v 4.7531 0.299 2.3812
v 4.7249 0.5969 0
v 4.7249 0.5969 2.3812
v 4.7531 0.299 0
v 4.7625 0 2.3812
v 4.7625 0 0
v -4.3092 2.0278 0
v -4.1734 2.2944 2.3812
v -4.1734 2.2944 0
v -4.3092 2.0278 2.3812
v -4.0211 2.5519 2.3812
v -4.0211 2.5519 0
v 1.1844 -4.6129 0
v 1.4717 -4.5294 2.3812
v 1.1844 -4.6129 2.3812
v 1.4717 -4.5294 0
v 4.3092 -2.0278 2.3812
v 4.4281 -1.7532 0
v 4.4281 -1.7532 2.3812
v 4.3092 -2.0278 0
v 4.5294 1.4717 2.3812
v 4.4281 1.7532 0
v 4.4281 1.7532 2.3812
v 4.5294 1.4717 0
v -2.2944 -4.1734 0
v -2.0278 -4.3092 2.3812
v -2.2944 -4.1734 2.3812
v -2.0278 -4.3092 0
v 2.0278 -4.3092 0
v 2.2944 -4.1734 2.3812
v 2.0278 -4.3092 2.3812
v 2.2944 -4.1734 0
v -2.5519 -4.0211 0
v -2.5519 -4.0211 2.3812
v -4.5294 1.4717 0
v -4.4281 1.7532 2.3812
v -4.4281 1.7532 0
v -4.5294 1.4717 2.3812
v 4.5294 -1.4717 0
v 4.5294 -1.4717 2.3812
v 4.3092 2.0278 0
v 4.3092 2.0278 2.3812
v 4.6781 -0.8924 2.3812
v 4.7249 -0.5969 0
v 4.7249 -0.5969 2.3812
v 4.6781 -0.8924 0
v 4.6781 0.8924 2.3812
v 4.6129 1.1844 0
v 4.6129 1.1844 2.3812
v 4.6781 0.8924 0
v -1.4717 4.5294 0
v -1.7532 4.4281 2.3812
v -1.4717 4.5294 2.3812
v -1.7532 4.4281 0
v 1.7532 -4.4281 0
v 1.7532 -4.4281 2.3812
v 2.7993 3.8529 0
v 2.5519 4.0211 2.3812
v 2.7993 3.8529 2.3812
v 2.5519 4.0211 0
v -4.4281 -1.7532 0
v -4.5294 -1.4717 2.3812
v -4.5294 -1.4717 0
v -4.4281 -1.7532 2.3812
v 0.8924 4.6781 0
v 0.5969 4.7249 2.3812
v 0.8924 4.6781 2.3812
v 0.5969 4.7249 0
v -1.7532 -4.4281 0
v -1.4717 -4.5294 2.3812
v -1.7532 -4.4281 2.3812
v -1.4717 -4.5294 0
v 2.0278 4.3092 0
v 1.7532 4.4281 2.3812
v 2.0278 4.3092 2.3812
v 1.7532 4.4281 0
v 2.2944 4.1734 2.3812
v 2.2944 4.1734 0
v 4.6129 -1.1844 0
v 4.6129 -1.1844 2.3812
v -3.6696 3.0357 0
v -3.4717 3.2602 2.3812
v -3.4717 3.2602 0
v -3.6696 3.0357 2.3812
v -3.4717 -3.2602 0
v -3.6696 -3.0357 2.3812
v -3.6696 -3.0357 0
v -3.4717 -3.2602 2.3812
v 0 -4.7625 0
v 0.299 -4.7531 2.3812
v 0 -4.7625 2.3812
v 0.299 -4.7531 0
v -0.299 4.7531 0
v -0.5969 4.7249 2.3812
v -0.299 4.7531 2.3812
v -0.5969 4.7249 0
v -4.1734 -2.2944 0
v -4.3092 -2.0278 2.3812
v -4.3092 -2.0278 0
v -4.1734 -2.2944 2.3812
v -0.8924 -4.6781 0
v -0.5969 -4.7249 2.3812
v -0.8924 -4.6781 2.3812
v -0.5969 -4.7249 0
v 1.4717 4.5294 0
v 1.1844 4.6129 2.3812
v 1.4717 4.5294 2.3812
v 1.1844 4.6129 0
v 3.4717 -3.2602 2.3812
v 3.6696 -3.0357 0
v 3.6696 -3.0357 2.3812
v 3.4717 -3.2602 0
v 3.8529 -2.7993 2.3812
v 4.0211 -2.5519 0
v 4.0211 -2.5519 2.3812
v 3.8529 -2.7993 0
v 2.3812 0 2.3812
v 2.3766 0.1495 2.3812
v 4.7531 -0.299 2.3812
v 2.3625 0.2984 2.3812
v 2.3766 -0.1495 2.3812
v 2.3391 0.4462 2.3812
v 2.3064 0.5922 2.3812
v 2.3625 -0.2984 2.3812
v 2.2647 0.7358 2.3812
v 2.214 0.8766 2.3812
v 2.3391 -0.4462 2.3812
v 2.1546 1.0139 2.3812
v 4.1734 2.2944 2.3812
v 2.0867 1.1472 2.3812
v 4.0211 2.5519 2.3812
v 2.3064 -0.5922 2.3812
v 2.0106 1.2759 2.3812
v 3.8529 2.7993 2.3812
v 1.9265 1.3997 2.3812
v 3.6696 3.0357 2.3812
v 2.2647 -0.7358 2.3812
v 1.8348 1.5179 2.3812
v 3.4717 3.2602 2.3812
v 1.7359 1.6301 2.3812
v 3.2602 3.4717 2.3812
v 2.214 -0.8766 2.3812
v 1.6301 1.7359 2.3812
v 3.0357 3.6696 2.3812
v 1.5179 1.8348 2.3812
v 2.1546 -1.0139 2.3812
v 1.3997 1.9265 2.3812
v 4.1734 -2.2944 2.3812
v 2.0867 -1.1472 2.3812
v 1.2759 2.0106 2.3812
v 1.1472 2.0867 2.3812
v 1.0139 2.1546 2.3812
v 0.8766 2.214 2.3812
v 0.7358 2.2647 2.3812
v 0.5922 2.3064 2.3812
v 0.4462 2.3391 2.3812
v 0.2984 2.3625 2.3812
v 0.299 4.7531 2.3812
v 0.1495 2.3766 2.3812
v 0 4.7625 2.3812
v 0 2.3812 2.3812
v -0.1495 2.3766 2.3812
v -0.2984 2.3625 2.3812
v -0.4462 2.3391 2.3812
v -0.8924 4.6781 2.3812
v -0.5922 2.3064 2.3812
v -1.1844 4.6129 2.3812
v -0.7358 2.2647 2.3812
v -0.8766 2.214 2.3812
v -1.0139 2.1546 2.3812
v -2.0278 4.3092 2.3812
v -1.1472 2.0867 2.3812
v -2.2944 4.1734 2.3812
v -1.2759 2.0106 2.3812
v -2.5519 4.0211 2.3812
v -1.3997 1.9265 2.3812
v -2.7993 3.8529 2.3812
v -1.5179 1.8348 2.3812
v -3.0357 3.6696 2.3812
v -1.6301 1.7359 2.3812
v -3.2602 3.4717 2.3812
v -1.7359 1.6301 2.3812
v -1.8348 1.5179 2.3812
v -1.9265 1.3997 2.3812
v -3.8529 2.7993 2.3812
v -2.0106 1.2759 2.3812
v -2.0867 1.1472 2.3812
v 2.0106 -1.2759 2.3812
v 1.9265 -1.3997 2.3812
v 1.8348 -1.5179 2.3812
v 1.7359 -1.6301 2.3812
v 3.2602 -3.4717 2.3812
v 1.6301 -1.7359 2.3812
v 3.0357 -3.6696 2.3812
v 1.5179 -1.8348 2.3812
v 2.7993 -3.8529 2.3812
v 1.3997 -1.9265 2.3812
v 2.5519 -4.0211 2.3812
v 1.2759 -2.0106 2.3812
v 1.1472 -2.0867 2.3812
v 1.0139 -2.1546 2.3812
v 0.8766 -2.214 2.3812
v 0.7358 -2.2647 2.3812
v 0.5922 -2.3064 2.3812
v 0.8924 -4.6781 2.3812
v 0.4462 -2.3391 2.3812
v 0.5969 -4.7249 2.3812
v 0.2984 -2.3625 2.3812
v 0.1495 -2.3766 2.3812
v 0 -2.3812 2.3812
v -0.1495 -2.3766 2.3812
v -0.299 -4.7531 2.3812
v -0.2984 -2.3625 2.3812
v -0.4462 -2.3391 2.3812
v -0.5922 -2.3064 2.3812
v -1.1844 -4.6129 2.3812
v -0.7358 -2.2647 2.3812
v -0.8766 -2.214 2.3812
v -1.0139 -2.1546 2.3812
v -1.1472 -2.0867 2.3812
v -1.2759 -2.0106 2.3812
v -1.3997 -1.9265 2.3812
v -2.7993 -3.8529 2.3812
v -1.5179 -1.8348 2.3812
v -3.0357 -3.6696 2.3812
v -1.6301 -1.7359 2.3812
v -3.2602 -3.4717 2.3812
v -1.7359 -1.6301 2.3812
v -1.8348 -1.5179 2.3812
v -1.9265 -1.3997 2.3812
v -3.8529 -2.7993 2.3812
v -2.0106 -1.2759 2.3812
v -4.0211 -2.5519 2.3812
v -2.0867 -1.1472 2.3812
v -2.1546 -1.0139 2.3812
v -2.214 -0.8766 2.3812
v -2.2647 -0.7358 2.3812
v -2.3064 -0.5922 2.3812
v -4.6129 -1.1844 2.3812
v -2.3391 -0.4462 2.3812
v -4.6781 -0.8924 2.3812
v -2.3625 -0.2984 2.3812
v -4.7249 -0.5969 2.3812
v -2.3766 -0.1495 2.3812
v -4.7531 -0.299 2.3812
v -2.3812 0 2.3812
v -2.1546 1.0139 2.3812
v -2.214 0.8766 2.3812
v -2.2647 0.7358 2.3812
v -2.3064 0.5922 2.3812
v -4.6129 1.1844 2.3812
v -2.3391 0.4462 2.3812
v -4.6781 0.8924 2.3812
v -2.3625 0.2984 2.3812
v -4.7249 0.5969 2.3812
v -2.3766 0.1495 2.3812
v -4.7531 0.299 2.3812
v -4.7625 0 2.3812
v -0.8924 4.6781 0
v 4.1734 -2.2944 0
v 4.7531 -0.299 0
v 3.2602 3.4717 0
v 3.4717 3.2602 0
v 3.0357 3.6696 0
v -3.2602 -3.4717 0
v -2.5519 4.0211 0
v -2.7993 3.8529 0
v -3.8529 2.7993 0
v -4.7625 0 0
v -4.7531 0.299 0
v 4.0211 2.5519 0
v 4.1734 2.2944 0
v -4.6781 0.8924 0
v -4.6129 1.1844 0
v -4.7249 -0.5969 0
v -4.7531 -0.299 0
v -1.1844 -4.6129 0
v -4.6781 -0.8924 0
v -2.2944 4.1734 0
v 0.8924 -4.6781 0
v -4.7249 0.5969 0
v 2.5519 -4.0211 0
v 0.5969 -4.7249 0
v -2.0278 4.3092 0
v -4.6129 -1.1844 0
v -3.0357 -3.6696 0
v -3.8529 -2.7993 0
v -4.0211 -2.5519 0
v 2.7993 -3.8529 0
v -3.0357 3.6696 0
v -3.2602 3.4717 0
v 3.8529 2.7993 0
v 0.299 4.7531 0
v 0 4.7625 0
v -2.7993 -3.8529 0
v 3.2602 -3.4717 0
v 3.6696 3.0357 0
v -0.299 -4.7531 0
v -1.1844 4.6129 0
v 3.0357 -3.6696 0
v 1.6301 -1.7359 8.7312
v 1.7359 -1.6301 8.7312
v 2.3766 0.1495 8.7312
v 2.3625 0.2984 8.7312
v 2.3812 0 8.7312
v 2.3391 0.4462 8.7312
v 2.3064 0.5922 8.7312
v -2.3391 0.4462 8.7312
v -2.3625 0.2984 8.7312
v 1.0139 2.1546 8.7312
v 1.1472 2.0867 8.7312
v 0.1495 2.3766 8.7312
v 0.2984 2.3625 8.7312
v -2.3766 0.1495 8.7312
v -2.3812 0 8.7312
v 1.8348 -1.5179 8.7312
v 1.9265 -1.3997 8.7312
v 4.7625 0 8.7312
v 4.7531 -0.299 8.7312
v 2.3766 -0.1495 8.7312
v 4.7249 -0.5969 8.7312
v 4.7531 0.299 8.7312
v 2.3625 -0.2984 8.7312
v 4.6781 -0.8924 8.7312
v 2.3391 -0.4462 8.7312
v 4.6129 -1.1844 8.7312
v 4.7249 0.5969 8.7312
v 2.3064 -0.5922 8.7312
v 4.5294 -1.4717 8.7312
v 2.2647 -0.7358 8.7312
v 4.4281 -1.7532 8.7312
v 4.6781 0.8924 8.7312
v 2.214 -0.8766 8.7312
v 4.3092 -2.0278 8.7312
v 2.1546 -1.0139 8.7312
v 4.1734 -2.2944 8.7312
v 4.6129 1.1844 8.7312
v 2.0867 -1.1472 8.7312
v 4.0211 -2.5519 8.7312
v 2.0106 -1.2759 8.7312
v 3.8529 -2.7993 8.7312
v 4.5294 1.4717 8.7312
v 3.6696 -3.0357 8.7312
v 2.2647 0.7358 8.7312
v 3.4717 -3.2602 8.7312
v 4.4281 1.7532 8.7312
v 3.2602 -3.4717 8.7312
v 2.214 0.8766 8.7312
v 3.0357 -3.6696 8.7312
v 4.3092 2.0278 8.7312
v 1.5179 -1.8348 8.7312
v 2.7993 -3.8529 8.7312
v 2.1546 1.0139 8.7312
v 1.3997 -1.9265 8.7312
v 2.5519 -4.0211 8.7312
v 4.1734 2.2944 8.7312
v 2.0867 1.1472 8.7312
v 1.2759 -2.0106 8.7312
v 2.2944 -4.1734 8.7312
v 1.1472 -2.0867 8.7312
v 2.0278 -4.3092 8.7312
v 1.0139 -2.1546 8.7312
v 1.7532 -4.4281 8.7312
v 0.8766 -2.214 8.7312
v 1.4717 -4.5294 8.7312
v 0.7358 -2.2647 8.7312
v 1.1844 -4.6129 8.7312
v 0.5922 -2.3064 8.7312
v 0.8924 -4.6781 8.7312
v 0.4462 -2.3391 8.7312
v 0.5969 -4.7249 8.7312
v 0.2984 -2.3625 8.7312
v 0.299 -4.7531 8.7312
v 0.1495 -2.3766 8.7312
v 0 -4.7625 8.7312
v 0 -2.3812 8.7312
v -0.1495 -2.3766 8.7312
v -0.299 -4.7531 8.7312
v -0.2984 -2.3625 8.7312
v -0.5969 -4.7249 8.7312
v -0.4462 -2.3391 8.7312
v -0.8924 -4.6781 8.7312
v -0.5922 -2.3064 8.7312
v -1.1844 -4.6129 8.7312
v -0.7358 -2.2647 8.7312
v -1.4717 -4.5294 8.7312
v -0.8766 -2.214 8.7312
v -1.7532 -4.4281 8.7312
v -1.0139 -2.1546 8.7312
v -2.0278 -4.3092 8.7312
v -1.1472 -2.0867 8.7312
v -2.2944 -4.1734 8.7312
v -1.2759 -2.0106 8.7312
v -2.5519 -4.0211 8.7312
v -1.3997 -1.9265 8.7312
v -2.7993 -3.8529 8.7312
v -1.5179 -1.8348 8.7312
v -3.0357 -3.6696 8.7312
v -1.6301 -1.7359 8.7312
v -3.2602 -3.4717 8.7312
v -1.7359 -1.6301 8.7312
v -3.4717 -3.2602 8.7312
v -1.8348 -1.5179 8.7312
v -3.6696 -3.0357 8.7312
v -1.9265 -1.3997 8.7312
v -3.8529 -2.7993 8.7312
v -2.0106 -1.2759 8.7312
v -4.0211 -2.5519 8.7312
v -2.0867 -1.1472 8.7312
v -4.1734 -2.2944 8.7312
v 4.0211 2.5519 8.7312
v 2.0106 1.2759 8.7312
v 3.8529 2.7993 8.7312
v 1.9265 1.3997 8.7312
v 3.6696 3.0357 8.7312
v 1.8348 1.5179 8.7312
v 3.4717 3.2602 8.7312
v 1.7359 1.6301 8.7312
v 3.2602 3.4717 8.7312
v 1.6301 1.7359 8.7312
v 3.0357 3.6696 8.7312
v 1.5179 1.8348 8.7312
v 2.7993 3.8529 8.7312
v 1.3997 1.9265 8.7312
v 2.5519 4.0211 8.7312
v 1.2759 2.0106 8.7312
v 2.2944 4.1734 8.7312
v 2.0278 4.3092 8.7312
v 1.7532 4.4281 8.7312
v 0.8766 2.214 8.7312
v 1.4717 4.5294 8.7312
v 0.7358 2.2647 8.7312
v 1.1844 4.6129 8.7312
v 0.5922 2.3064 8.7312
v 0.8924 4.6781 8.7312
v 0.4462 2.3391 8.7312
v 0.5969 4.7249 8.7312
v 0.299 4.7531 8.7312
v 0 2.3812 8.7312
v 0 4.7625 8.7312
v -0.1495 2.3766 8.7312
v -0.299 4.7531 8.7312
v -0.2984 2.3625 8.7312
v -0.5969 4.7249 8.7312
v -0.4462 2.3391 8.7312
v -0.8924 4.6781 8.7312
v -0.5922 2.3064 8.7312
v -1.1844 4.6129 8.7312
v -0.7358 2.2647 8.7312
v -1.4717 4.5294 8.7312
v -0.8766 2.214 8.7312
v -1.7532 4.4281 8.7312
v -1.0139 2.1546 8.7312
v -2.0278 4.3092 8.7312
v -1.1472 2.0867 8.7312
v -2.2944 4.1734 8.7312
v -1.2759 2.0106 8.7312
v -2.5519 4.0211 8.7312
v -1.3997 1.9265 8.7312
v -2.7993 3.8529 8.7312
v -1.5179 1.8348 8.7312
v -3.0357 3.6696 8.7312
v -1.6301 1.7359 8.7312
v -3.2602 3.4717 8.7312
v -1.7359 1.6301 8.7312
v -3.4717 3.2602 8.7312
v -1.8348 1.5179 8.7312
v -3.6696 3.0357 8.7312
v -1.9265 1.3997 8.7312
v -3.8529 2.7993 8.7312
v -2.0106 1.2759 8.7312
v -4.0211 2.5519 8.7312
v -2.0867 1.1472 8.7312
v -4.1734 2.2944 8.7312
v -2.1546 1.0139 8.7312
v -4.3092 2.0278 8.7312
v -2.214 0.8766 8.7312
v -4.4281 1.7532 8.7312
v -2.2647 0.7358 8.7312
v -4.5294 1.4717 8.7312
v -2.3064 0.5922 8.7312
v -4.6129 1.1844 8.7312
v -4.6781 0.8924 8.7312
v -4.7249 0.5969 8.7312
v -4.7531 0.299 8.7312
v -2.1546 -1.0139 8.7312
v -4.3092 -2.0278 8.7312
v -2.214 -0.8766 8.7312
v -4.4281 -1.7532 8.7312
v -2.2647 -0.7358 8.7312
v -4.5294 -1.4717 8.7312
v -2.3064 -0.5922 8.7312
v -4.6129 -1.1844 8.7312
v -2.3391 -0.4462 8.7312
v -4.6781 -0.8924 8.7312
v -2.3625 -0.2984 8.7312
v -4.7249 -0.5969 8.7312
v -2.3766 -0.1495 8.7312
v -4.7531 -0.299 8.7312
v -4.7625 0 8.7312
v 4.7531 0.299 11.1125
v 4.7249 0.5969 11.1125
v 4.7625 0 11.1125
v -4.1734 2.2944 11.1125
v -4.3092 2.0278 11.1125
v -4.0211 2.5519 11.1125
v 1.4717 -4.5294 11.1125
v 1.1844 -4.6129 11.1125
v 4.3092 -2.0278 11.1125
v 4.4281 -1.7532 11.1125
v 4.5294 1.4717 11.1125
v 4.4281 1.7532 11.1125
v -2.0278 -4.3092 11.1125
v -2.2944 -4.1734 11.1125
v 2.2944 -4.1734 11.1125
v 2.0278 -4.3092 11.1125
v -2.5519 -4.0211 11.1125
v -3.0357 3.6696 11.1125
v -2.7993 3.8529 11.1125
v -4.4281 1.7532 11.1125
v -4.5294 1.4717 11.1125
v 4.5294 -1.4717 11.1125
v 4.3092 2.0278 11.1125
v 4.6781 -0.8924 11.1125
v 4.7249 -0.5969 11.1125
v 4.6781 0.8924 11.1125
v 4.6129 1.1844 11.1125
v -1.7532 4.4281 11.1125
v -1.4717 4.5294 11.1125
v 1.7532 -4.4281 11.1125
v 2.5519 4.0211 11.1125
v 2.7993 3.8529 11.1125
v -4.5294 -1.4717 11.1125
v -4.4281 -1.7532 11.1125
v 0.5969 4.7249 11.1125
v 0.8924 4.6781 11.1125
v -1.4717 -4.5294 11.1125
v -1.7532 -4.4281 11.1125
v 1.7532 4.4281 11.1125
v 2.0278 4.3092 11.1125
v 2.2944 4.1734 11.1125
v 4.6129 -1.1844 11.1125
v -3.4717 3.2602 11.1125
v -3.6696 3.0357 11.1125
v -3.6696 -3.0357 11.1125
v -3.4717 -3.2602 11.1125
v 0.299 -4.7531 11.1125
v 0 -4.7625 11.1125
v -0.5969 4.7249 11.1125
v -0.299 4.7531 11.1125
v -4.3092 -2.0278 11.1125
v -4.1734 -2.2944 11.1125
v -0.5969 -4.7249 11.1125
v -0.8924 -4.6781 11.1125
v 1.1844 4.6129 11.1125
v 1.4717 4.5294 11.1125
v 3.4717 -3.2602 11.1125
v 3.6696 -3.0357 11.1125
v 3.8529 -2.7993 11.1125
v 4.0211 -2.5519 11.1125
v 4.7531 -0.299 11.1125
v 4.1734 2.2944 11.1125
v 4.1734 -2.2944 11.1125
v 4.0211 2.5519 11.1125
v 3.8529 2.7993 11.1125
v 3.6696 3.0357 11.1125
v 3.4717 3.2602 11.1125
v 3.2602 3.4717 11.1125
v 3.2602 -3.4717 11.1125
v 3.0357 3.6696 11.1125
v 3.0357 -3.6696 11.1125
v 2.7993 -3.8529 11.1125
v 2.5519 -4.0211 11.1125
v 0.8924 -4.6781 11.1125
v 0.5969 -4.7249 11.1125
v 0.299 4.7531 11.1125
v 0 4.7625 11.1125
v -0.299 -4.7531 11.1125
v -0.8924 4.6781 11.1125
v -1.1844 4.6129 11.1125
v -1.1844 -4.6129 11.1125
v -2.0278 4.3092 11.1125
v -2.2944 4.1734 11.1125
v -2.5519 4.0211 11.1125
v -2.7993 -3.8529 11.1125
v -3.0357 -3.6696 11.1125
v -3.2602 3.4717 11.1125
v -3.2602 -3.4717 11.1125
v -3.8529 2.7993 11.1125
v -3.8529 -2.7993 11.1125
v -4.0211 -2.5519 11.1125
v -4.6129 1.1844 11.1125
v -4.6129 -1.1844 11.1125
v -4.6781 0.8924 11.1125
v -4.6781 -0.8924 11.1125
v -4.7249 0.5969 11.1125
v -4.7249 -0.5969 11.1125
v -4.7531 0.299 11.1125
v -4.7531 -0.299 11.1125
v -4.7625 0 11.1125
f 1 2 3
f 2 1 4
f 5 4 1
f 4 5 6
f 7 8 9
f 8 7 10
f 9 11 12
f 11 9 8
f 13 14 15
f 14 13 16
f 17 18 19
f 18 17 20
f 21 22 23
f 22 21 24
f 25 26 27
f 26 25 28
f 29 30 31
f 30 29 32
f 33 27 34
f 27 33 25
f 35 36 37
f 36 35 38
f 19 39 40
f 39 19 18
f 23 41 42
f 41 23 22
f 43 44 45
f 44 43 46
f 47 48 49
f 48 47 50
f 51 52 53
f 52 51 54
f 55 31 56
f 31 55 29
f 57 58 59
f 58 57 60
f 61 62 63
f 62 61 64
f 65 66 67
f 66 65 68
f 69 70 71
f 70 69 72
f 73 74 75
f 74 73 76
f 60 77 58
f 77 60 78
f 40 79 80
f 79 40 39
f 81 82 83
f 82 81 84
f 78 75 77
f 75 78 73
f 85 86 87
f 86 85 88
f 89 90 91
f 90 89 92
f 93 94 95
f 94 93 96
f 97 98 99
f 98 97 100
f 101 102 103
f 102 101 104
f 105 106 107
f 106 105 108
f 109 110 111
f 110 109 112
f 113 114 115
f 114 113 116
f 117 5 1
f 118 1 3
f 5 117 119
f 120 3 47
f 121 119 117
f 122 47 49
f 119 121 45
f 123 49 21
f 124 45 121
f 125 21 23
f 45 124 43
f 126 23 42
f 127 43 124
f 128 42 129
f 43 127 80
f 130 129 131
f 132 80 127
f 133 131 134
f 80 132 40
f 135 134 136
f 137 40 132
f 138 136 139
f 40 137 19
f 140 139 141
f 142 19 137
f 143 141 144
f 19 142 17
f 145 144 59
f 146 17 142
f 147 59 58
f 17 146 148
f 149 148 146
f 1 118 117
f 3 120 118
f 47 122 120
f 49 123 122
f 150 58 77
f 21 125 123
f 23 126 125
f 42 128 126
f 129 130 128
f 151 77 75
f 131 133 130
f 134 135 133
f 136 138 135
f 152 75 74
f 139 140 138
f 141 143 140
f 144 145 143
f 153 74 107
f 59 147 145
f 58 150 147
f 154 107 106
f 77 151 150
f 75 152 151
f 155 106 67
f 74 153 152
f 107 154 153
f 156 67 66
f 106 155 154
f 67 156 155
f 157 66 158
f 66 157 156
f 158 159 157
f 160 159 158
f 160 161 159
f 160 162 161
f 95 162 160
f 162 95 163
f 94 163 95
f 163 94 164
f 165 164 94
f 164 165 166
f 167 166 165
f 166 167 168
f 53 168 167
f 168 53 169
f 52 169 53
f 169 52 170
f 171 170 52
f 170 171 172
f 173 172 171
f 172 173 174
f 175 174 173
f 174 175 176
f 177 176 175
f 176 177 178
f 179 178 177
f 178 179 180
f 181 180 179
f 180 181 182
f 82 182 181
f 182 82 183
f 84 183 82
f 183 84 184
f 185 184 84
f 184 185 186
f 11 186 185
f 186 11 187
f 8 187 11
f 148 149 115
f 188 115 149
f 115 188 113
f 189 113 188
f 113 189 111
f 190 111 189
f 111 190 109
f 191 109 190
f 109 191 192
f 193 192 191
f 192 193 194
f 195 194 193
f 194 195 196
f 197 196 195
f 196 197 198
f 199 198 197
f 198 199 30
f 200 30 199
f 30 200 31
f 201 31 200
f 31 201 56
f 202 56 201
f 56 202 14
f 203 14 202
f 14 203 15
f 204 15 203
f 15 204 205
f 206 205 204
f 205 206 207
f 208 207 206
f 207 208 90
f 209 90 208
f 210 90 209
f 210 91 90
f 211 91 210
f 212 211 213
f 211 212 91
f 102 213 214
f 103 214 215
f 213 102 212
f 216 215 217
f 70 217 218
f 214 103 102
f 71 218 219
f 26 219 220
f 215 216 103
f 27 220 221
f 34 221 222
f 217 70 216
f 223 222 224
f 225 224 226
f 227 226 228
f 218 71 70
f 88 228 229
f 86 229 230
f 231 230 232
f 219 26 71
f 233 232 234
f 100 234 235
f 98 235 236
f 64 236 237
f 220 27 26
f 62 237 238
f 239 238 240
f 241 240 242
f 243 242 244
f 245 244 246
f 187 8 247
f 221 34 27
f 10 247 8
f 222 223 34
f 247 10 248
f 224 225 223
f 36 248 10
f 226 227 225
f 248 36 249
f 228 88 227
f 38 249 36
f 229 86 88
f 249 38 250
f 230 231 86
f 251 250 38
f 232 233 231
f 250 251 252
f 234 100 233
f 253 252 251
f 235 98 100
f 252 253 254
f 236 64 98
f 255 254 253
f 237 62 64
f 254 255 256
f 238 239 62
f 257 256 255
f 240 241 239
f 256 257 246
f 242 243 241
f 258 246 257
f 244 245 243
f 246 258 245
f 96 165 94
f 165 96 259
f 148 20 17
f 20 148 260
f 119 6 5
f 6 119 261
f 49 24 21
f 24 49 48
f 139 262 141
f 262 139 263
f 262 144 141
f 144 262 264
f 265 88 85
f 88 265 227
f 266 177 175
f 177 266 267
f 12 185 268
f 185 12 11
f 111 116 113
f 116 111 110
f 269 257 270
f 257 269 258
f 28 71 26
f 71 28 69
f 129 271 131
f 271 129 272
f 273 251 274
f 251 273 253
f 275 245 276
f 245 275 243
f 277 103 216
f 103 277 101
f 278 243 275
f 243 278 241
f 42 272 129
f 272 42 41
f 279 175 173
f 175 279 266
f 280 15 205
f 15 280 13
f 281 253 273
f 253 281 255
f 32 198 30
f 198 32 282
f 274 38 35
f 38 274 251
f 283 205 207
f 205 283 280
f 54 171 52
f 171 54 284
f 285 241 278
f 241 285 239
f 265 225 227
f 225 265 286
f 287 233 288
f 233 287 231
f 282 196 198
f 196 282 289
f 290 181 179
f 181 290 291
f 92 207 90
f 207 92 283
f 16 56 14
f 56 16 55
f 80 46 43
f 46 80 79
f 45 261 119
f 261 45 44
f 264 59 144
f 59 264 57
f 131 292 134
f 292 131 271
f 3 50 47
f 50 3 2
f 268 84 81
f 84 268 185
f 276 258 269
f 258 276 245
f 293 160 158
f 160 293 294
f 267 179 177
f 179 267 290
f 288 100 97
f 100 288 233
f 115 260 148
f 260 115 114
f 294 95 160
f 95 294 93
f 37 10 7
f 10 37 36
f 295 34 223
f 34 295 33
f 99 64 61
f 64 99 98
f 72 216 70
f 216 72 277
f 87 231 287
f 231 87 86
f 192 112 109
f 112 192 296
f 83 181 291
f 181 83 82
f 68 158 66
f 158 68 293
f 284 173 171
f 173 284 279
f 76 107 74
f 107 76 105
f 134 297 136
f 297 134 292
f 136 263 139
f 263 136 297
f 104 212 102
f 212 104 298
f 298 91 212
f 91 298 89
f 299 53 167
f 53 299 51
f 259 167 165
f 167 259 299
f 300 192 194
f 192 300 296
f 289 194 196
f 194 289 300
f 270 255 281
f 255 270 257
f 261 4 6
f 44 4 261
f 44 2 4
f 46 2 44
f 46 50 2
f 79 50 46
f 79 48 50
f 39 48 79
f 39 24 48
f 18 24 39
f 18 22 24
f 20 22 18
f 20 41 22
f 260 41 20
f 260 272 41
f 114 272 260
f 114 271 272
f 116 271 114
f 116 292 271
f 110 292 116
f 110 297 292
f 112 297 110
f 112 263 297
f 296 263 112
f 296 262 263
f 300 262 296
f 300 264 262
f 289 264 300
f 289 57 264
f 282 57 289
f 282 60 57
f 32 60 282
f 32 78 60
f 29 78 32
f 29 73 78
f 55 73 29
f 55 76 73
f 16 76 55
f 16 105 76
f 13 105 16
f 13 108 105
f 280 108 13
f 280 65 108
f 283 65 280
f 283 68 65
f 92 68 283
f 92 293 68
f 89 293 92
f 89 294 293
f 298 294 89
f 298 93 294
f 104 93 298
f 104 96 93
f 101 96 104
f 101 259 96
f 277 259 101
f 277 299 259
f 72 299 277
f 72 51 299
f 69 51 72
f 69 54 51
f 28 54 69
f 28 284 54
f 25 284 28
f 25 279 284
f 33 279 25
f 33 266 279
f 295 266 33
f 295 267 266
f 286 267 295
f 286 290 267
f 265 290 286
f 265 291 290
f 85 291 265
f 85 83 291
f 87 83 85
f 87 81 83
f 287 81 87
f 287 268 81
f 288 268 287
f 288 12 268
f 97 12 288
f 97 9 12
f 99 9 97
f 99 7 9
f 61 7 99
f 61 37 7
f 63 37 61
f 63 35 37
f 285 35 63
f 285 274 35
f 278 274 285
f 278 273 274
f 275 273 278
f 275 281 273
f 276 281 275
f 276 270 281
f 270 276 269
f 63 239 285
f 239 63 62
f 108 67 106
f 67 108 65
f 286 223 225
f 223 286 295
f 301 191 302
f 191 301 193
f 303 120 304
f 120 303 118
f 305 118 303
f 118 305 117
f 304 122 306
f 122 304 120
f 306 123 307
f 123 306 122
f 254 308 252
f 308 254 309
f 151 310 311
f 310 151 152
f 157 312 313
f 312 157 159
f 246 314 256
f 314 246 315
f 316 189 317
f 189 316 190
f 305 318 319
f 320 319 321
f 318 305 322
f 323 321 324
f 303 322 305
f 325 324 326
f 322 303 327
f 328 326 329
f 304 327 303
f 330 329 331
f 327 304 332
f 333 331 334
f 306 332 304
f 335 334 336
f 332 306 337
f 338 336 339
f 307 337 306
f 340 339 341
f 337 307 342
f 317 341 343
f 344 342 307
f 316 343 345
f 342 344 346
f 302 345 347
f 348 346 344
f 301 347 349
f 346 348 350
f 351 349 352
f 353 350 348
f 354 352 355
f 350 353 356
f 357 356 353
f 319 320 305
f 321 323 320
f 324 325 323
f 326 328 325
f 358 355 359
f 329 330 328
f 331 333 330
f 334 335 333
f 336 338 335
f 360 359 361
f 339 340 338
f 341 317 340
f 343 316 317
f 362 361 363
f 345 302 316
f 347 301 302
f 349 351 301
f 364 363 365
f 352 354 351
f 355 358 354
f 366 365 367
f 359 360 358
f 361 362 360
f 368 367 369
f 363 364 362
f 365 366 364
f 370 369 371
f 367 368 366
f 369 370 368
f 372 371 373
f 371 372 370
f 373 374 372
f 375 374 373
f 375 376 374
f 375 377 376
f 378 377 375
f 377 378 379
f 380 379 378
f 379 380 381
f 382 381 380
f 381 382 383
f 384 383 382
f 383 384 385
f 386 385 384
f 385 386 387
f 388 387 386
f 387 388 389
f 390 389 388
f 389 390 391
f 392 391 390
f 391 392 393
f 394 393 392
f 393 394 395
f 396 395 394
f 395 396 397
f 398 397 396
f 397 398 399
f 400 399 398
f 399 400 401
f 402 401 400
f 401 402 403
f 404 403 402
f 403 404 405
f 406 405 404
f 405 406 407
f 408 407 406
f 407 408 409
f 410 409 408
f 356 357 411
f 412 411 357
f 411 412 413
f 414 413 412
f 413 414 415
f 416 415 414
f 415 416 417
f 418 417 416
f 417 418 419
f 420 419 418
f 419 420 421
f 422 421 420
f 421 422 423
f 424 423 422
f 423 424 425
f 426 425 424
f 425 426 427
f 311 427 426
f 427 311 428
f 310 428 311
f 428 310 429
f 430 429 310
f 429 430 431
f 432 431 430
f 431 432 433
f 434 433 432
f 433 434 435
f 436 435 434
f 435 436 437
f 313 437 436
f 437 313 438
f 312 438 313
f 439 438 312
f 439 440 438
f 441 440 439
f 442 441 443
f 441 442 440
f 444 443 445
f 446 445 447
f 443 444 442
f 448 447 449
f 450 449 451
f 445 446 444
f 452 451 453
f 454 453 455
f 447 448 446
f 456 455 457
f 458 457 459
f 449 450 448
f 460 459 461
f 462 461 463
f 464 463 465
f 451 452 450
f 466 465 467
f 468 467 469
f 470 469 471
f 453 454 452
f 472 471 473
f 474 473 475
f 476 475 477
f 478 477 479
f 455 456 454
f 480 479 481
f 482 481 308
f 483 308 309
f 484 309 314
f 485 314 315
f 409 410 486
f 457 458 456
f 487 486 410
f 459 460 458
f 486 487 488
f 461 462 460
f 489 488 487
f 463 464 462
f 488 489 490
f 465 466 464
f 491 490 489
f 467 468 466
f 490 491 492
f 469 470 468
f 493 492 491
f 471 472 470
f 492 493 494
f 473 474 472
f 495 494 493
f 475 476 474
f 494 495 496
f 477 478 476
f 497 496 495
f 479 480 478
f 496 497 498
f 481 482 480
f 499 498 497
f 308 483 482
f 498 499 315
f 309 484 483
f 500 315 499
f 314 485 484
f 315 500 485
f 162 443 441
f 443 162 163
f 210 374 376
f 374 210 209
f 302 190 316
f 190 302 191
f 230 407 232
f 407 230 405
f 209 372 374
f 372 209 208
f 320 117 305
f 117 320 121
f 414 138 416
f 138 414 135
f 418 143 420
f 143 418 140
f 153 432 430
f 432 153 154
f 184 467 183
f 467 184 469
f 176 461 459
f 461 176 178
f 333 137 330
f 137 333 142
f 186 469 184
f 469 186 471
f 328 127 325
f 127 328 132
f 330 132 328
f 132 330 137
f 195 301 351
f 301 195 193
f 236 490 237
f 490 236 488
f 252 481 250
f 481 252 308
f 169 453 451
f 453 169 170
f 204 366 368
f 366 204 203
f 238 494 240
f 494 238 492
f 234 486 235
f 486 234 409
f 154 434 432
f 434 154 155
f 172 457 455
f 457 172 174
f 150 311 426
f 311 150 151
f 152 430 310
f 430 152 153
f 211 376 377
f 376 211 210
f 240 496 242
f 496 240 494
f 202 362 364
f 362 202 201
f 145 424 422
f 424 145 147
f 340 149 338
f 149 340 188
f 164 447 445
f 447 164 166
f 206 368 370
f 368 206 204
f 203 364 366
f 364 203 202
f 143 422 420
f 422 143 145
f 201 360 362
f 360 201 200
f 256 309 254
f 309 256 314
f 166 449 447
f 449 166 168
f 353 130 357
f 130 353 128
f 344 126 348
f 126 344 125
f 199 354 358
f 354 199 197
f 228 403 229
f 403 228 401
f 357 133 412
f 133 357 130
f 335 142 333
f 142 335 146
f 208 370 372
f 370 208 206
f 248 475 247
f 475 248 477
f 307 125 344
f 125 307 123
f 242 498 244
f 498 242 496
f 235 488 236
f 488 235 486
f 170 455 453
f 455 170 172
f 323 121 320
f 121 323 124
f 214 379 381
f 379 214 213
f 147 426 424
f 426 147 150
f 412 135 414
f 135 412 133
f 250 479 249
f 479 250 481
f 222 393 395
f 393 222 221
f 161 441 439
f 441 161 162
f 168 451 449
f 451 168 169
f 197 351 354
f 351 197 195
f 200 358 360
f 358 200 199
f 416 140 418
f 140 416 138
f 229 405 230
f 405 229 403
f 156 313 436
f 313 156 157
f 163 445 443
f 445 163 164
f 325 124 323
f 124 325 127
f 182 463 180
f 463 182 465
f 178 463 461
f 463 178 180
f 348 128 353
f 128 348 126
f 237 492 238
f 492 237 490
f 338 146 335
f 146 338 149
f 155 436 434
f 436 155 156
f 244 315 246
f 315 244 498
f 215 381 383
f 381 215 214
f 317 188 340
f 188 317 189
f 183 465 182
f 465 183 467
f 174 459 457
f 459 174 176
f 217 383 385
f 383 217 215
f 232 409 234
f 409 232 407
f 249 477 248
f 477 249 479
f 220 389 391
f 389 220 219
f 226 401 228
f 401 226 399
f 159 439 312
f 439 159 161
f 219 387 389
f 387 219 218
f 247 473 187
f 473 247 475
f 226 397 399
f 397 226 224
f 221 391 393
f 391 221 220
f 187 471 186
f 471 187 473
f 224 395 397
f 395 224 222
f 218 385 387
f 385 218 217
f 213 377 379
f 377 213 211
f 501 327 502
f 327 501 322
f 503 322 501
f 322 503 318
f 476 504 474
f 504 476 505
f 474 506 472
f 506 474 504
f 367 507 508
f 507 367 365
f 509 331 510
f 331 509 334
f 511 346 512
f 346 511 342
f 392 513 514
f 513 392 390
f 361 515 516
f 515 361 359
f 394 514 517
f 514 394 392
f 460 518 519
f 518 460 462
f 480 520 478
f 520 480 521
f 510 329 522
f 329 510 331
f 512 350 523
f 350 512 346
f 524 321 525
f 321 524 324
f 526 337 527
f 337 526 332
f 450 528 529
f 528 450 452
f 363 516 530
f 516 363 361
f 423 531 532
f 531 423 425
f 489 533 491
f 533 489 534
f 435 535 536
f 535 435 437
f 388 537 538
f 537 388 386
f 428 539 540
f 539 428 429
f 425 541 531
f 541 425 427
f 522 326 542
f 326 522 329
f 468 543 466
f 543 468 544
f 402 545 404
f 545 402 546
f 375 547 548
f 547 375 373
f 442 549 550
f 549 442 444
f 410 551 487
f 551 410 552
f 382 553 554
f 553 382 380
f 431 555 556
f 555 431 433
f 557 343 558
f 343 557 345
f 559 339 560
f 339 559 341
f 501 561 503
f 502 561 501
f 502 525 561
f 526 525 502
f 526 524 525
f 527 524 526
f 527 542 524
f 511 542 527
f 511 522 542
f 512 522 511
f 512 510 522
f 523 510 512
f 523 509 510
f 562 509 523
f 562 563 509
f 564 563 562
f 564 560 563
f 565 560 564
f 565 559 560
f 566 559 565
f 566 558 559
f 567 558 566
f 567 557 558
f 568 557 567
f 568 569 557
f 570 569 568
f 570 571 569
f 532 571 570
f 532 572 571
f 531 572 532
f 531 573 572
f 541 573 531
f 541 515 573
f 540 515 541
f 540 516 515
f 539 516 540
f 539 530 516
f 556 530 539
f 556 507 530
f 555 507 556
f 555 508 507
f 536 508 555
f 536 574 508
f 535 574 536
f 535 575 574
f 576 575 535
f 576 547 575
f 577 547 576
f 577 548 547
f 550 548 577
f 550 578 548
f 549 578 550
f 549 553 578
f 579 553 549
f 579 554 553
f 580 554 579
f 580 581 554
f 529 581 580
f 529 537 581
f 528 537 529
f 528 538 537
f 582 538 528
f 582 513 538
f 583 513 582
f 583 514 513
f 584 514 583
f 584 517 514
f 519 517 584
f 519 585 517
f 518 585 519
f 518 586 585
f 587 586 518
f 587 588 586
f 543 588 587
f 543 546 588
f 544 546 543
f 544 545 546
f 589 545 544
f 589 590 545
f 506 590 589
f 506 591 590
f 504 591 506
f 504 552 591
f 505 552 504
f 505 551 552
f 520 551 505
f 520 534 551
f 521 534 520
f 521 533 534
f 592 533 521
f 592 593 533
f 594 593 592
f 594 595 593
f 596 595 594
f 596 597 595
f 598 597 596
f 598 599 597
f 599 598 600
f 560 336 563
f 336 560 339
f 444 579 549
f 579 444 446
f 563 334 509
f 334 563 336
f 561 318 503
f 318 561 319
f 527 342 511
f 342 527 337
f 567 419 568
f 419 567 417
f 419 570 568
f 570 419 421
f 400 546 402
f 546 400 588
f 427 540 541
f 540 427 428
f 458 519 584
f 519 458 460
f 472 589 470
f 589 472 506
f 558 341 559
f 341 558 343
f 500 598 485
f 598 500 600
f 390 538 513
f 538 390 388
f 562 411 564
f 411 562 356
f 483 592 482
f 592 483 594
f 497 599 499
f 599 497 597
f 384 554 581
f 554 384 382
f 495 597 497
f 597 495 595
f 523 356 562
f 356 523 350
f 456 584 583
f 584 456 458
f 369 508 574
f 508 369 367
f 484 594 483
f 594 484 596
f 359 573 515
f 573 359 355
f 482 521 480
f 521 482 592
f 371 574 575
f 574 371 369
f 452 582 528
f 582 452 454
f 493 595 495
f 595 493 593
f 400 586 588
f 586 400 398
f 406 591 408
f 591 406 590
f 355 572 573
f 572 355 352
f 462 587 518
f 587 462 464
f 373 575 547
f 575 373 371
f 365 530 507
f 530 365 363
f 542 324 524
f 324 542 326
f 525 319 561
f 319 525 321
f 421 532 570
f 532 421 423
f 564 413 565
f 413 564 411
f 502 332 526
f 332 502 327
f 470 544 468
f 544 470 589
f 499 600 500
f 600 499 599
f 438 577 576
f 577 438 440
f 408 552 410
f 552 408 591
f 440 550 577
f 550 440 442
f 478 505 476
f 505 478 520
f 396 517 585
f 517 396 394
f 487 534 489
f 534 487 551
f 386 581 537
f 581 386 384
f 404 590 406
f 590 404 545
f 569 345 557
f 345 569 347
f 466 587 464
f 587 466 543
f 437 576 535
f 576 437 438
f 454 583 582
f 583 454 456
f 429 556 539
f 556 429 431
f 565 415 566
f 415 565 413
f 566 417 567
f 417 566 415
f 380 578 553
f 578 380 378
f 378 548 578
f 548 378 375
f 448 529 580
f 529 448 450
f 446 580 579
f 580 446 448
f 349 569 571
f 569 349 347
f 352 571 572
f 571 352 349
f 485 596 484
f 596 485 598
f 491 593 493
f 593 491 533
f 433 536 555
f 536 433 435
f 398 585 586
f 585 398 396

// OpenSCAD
inch=25.4;

cylinder((1/8-1/32)*inch,3/16*inch,3/16*inch,$fn=100);

translate([0,0,(1/8-1/32)*inch])
cylinder(1/4*inch,3/32*inch,3/32*inch,$fn=100);

translate([0,0,(1/4+1/8-1/32)*inch])
cylinder((1/8-1/32)*inch,3/16*inch,3/16*inch,$fn=100);
